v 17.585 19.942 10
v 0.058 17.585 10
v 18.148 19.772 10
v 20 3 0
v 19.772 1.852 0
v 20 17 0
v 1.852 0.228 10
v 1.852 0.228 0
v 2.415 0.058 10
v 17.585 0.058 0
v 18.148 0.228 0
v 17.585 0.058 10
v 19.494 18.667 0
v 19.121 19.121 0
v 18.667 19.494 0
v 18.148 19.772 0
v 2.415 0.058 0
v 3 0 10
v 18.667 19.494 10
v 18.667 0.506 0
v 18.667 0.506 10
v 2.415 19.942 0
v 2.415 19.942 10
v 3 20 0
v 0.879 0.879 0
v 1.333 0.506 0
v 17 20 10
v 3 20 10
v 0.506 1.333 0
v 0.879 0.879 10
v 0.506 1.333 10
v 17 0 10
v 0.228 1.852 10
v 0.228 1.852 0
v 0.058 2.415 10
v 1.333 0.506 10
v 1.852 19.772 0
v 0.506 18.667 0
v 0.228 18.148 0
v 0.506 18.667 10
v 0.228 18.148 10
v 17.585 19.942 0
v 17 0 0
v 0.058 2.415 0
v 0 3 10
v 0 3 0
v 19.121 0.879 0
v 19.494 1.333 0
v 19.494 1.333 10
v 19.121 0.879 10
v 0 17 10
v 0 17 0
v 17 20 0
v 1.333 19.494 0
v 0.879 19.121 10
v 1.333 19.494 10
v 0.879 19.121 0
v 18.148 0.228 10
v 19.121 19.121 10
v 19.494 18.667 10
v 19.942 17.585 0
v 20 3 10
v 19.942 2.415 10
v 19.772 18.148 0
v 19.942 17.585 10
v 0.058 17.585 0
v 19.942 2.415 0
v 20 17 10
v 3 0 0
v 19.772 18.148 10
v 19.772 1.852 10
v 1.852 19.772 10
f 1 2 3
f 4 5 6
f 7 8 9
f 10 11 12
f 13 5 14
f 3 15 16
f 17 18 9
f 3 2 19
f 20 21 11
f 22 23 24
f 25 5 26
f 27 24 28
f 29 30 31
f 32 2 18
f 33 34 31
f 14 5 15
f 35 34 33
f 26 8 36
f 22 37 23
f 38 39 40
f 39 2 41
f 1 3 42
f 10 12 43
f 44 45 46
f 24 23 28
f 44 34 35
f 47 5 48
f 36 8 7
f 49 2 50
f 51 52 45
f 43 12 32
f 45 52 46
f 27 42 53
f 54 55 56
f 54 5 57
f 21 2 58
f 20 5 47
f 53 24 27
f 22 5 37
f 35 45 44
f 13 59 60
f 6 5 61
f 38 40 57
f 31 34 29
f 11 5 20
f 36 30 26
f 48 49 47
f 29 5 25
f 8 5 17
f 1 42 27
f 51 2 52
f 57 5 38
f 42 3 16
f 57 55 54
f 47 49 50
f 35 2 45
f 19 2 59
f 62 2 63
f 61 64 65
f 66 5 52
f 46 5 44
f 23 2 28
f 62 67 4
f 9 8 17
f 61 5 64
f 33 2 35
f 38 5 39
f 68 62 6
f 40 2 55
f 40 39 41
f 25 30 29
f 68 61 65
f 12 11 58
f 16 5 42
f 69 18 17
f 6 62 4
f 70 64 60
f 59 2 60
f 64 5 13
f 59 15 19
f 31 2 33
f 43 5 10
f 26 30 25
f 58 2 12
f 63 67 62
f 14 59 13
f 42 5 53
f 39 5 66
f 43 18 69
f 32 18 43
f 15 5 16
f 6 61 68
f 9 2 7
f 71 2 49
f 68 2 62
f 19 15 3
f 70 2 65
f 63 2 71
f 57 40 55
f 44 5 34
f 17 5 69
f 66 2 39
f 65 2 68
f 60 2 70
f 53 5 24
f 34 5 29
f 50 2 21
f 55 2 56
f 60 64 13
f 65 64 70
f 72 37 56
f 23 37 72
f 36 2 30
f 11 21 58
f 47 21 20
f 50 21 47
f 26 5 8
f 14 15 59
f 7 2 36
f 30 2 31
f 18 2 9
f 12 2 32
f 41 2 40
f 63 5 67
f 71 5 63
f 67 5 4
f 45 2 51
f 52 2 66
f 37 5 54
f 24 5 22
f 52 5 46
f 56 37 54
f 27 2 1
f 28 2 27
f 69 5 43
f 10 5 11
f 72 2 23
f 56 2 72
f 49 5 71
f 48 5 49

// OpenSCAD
// Test fixture used only to rehearse the MakerWorld publish/update automation.
// Not a real product — safe to publish as a private/throwaway listing.

/* [Dimensions] */
// Width of the box (mm)
Width = 20; // [10:5:100]
// Depth of the box (mm)
Depth = 20; // [10:5:100]
// Height of the box (mm)
Height = 10; // [5:5:50]

/* [Corner] */
// Rounded corner radius (mm). 0 disables rounding.
Corner_Radius = 3; // [0:1:10]

// Marker section for the 2026-08-09 --scad delete+reupload test: a brand new
// parameter group is the only unambiguous signal that the raw .scad on
// MakerWorld was really replaced. Defaults to 0 so the default geometry (and
// therefore the .3mf) is unchanged, isolating the customizer-source path.
/* [Lid] */
// Thickness of a solid lid on top (mm). 0 disables the lid.
Lid_Thickness = 0; // [0:1:10]

module rounded_box(w, d, h, r) {
    if (r <= 0) {
        cube([w, d, h]);
    } else {
        hull() {
            for (x = [r, w - r])
                for (y = [r, d - r])
                    translate([x, y, 0])
                        cylinder(r = r, h = h, $fn = 32);
        }
    }
}

rounded_box(Width, Depth, Height, Corner_Radius);

if (Lid_Thickness > 0)
    translate([0, 0, Height])
        rounded_box(Width, Depth, Lid_Thickness, Corner_Radius);
